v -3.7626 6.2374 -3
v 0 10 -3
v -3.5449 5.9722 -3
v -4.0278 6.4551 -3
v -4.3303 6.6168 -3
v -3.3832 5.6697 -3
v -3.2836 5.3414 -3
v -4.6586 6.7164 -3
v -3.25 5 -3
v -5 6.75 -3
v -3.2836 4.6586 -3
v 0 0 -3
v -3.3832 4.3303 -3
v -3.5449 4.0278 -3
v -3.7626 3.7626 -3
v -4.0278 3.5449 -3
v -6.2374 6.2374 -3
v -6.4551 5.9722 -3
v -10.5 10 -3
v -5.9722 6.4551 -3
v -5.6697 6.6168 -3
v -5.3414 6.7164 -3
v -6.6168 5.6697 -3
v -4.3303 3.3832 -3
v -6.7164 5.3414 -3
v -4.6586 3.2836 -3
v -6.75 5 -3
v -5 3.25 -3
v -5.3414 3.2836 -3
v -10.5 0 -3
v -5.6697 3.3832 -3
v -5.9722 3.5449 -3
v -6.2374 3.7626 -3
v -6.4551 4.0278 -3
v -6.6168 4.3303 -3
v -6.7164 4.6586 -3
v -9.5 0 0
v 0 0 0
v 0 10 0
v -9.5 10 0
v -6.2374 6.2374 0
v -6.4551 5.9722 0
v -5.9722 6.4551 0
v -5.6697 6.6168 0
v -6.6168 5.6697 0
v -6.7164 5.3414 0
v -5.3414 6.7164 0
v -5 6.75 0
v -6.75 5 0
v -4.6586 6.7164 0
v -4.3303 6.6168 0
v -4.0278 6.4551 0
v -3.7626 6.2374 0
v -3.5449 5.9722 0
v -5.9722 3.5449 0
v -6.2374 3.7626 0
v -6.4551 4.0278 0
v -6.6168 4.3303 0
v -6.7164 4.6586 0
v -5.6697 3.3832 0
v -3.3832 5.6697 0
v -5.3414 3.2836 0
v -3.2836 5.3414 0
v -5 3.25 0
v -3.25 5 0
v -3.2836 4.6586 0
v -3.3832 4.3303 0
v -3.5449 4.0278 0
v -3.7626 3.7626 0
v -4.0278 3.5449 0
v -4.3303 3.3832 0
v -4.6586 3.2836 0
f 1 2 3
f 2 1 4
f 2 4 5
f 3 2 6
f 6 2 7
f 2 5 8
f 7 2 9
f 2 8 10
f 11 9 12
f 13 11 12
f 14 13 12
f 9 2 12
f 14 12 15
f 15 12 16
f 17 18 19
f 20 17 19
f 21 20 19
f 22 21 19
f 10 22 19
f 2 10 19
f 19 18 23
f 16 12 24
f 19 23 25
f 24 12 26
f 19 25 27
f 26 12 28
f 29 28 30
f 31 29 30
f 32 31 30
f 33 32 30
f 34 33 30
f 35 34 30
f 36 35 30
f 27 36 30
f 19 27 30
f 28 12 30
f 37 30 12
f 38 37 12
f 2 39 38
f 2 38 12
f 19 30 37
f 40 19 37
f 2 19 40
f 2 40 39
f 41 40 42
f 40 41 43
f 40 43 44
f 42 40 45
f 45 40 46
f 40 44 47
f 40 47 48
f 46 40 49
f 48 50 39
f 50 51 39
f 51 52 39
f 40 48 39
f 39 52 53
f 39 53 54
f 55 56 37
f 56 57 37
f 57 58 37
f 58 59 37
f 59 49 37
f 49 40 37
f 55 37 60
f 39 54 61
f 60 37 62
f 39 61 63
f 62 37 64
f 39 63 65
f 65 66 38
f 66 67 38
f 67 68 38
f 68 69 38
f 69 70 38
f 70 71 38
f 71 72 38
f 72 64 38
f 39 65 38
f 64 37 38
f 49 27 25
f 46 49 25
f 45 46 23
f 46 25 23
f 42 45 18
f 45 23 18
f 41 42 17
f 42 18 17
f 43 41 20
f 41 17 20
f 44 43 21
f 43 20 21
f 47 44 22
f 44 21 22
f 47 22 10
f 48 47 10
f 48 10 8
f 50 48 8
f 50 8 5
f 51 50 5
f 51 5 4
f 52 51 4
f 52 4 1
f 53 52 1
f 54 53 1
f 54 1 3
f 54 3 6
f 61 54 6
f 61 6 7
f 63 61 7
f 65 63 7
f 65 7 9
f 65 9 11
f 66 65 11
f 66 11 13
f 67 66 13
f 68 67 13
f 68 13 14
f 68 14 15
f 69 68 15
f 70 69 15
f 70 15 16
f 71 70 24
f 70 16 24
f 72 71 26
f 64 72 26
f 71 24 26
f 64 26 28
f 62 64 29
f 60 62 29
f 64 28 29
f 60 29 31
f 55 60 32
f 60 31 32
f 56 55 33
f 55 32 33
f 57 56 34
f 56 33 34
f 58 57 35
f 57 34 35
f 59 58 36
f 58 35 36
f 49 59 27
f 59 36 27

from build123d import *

# Parameters (mm, degrees)
BOSS_EXTRUDE1_DEPTH = 10
SKETCH2_R           = 1.75
CUT_EXTRUDE1_DEPTH  = 15.807092895


with BuildPart() as part:
    # Sketch1 → Boss-Extrude1 (new body)
    with BuildSketch(Plane(origin=(0, 0, 0), x_dir=(1, 0, 0), z_dir=(0, 1, 0))):
        Polygon((0, 0), (0, 3), (-10.5, 3), (-9.5, 0), align=None)
    extrude(amount=BOSS_EXTRUDE1_DEPTH)

    # Sketch2 → Cut-Extrude1 (cut, through all)
    with BuildSketch(Plane(origin=(0, 0, -3), x_dir=(-1, 0, 0), z_dir=(0, 0, -1))):
        with Locations((5, 5)):
            Circle(SKETCH2_R)
    extrude(amount=-CUT_EXTRUDE1_DEPTH, mode=Mode.SUBTRACT)


solid = part.part
